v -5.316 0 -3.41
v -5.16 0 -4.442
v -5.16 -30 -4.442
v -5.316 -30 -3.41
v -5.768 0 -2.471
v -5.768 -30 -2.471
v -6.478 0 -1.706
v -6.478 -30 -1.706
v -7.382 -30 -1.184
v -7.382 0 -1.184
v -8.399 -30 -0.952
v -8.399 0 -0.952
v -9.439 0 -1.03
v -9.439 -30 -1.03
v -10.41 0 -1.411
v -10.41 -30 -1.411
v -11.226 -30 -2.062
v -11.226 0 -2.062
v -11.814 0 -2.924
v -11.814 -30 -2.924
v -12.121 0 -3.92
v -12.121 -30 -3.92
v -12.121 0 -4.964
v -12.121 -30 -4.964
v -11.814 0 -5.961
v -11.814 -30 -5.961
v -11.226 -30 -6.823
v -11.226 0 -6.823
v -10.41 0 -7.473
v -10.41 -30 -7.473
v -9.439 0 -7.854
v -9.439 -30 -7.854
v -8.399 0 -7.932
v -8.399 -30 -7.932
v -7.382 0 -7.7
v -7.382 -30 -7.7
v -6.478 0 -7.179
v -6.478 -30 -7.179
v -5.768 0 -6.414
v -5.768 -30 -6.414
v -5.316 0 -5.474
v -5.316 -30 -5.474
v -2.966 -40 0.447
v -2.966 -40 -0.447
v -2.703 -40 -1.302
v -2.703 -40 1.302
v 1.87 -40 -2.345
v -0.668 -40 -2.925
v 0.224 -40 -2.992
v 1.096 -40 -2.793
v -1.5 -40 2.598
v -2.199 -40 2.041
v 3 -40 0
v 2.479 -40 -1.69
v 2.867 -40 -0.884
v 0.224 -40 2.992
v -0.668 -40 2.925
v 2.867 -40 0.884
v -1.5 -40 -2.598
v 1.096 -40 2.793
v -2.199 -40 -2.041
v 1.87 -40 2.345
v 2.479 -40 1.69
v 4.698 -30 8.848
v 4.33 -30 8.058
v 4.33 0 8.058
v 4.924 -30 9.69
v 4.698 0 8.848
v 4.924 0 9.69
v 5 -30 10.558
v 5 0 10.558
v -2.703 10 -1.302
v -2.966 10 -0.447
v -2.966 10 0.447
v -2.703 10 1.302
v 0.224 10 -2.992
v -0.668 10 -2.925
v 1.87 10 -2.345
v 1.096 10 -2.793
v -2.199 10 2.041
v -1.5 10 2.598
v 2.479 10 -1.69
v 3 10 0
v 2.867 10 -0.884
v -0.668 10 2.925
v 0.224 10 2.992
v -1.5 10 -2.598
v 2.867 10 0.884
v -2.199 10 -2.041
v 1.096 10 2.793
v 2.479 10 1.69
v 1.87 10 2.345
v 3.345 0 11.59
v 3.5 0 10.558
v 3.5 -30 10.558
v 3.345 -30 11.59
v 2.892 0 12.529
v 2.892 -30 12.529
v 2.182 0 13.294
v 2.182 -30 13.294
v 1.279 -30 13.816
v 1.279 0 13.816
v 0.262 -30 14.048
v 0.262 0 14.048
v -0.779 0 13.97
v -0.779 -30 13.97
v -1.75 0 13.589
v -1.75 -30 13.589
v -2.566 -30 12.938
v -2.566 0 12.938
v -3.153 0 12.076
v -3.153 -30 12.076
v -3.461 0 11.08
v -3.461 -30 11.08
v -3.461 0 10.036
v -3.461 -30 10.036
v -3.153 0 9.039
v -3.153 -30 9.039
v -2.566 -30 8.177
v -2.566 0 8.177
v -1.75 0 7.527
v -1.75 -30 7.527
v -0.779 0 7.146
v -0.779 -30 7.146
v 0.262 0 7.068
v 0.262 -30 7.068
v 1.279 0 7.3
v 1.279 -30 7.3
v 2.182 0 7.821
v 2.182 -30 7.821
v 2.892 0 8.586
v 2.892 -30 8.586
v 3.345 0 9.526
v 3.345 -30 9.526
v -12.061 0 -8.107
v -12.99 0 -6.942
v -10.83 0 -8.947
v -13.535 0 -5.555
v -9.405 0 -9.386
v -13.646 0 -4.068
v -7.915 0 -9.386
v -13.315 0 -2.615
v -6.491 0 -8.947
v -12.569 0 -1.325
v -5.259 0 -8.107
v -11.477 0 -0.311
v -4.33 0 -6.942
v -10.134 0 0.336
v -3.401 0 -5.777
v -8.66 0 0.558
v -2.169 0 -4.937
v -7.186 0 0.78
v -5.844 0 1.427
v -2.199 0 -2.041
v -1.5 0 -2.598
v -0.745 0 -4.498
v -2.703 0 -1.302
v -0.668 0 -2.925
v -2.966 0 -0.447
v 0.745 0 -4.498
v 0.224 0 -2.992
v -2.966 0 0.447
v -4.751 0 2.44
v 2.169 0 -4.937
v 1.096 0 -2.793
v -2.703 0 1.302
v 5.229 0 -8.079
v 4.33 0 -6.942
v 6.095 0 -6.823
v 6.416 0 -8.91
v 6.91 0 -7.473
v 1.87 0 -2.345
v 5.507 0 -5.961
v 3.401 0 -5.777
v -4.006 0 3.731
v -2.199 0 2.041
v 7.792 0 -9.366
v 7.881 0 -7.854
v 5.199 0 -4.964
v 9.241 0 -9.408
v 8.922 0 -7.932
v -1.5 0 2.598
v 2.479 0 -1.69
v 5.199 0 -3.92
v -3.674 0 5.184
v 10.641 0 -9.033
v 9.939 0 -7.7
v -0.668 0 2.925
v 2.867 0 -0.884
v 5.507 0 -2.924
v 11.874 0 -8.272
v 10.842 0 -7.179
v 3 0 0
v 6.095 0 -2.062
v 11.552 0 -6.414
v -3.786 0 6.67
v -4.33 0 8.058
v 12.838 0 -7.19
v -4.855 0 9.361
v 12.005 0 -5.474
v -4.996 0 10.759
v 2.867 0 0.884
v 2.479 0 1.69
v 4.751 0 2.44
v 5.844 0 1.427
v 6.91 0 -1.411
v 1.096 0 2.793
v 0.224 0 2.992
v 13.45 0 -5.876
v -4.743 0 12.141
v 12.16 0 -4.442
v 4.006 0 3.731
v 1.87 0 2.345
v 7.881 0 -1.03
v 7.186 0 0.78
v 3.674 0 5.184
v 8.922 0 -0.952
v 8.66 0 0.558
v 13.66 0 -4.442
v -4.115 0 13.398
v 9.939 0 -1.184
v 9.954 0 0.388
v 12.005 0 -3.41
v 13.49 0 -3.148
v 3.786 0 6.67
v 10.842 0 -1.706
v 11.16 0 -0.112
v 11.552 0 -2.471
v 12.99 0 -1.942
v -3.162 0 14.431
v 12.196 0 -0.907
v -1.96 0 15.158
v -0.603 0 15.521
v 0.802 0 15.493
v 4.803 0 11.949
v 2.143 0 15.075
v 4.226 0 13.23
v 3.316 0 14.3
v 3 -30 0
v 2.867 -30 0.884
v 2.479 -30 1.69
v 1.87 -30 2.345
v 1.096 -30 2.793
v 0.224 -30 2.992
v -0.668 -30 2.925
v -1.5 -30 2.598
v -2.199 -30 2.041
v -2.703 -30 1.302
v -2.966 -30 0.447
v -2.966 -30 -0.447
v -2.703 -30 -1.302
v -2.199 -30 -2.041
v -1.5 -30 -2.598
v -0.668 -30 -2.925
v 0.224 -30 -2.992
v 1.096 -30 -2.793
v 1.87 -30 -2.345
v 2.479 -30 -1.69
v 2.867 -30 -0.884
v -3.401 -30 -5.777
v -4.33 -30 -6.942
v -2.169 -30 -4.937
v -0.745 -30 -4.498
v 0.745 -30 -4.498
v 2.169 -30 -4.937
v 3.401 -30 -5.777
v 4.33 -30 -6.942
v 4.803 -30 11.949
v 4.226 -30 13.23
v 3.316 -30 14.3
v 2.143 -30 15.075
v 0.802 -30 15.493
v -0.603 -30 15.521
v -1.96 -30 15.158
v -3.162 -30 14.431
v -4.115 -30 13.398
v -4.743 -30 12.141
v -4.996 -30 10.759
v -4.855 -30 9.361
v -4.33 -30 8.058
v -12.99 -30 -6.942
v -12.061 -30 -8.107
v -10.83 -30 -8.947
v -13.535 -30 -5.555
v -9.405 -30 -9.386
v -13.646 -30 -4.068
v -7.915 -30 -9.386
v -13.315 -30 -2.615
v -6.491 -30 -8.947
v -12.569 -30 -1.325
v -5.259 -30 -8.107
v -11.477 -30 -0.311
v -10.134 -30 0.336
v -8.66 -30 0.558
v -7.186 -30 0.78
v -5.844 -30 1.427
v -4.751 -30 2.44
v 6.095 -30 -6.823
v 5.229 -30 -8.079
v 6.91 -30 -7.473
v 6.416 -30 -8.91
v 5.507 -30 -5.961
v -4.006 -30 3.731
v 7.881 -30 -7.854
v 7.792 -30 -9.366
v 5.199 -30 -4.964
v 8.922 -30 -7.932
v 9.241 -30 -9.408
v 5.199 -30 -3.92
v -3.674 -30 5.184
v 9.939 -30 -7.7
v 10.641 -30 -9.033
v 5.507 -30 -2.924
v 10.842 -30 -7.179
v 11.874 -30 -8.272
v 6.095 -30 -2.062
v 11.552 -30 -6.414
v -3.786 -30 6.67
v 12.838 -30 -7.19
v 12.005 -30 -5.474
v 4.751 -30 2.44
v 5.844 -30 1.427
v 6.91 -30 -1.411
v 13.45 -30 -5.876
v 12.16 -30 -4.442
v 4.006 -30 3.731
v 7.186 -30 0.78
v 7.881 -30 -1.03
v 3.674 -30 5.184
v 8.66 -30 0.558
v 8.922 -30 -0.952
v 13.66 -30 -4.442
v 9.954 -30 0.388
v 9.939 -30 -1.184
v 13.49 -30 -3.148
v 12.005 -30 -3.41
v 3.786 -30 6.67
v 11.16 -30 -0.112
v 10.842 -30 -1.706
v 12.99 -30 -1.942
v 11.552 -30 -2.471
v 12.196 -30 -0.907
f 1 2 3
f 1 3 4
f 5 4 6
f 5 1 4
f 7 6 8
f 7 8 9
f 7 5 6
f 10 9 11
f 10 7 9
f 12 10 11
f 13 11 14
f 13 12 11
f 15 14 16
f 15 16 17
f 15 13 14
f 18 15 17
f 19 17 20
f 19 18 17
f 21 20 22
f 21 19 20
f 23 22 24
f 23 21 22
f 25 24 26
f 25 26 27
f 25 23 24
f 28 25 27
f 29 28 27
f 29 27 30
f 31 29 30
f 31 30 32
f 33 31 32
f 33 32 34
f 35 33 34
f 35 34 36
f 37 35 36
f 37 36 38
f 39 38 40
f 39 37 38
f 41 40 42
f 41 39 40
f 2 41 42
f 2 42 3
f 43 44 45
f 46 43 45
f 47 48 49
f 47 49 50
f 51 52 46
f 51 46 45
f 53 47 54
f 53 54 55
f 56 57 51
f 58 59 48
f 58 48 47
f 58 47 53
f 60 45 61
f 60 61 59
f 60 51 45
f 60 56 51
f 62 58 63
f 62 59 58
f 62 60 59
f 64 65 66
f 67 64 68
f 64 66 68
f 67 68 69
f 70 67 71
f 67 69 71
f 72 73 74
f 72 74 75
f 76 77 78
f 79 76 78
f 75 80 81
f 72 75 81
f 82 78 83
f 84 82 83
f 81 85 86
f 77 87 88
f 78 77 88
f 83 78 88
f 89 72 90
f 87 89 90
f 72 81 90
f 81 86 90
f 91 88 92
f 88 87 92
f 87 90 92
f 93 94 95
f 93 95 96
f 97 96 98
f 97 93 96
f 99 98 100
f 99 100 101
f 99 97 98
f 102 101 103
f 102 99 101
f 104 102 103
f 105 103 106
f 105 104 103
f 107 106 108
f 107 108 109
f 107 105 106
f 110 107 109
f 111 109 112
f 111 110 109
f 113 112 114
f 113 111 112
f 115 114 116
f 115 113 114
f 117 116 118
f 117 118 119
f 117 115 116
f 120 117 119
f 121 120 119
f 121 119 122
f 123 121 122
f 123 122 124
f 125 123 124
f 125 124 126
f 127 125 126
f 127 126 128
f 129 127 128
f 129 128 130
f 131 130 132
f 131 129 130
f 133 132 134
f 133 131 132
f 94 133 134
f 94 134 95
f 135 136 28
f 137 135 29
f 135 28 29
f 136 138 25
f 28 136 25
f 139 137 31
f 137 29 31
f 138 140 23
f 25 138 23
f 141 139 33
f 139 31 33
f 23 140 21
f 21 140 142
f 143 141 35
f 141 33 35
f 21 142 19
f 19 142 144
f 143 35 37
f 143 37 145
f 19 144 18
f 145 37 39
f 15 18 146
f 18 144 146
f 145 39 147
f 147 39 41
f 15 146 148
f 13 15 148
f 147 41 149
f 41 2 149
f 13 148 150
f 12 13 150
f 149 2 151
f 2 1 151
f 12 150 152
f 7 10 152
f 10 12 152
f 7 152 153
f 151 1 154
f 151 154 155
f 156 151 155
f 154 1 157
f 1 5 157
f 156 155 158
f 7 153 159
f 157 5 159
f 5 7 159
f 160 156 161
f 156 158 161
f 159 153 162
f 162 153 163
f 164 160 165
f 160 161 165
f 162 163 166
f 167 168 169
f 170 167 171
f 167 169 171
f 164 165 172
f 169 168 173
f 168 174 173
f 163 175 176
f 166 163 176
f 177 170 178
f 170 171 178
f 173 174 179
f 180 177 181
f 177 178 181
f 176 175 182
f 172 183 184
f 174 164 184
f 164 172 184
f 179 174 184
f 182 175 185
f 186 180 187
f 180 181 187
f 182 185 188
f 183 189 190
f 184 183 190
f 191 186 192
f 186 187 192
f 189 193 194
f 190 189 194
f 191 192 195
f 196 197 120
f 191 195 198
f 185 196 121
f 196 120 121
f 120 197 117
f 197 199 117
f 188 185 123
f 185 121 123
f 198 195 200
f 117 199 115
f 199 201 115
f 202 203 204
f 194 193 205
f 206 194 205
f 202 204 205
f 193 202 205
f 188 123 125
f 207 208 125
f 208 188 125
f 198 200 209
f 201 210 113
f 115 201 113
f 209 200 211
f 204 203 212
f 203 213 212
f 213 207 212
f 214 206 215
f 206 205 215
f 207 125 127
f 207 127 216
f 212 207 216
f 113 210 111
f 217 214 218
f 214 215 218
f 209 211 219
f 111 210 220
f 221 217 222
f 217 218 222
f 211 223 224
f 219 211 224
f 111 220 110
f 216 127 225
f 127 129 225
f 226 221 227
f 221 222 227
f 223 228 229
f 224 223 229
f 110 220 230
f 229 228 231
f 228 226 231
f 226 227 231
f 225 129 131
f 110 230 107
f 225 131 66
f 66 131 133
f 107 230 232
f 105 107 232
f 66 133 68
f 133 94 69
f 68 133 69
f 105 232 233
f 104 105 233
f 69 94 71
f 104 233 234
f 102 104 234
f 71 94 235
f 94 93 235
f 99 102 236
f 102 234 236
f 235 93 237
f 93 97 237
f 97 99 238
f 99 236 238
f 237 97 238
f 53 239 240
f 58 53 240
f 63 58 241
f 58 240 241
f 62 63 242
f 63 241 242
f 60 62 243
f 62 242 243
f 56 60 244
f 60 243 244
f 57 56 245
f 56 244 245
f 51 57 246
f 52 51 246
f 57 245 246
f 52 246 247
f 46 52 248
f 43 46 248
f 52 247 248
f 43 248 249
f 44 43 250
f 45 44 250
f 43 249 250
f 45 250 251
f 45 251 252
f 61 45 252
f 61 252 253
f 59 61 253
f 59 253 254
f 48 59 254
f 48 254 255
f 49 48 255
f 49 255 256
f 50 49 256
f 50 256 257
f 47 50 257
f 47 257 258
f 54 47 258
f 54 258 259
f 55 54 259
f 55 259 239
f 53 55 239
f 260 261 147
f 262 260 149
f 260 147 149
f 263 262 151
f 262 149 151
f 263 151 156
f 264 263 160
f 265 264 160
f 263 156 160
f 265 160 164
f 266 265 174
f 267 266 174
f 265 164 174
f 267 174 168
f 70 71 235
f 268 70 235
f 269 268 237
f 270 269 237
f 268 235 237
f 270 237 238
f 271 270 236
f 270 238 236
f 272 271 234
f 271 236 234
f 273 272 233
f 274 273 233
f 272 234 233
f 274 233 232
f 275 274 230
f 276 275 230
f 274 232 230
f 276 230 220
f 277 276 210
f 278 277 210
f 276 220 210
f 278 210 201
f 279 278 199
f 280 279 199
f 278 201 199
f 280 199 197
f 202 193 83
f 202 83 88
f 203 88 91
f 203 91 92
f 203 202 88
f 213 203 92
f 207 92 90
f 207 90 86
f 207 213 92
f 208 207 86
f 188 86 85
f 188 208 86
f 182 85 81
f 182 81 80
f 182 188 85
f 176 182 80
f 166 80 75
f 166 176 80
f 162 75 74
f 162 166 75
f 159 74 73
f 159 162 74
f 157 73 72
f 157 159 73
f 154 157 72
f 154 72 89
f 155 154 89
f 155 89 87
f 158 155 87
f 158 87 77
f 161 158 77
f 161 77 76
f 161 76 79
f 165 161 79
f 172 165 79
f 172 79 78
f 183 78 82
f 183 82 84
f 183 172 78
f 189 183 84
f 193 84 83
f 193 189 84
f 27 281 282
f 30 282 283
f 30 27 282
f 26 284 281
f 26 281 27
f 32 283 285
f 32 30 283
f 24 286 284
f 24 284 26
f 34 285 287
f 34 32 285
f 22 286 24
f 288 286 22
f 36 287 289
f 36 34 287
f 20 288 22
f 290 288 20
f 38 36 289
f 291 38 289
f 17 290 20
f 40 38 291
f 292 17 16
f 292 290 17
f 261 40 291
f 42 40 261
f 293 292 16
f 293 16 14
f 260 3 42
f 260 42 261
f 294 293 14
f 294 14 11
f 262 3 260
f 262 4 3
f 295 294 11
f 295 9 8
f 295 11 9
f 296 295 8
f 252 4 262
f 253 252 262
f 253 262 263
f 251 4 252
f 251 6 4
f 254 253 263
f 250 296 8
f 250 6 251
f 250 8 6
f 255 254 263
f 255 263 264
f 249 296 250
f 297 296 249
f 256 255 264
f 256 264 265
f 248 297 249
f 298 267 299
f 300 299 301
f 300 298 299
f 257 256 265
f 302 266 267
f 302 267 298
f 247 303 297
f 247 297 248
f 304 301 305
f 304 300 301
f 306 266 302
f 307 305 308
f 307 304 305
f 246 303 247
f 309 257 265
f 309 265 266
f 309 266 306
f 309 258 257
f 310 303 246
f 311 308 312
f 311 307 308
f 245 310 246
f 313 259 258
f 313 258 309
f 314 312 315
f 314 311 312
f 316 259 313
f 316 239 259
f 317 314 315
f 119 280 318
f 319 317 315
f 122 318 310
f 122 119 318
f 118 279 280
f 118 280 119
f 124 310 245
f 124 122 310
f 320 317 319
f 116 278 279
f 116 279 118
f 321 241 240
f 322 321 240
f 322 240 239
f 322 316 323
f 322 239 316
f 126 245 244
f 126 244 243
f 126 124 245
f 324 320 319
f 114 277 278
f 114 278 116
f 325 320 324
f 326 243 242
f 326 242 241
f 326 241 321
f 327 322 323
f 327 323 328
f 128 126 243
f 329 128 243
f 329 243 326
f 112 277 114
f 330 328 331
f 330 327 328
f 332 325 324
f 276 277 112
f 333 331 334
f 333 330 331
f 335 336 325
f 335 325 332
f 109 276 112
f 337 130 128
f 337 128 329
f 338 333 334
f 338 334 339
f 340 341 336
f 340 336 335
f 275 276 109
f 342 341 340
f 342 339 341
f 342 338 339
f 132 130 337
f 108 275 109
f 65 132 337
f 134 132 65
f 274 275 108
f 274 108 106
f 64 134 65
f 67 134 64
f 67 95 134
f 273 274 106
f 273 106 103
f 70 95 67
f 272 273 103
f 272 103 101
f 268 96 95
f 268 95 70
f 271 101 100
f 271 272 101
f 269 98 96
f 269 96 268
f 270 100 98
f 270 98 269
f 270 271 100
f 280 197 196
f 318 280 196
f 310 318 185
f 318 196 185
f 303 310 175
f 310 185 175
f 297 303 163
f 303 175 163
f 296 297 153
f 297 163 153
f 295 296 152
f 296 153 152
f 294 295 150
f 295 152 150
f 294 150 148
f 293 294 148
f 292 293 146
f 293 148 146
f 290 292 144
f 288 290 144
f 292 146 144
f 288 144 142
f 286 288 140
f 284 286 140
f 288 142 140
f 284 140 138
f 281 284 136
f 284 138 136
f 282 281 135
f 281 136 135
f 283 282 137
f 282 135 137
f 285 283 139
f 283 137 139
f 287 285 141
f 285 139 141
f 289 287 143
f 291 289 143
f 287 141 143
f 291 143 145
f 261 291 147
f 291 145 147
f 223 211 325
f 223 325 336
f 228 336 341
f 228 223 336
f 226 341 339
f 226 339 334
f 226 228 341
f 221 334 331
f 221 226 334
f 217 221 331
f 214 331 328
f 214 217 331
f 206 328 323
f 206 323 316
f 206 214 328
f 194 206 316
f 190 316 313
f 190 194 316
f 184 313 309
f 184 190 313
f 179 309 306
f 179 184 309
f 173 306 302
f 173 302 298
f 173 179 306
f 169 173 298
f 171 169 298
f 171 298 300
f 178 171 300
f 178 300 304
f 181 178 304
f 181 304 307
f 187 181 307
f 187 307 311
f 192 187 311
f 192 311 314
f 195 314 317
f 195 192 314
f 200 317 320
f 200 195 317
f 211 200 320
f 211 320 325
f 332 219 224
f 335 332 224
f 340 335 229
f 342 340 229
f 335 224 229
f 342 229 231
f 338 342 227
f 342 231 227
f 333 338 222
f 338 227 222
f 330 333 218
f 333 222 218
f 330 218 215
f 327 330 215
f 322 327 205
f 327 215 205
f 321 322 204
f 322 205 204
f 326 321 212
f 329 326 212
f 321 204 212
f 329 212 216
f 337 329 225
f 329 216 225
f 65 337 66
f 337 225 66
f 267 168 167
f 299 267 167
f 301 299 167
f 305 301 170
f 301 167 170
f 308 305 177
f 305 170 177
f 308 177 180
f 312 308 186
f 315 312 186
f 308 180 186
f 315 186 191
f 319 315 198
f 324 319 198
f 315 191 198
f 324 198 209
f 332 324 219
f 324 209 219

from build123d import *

# Parameters (mm, degrees)
F0_R          = 3.5
F1_DEPTH      = 30
F2_R          = 3
F3_DEPTH      = 40
F3_DEPTH_BACK = 10


# Not quite as in the source:
# - ends of sketch curves that miss each other by under 0.0002 mm in the source are joined


with BuildPart() as f1:
    # F0 (on Front) → F1 (new body)
    with BuildSketch(Plane.XZ):
        with BuildLine():
            ThreePointArc((-4.3301281481, 8.0578746702), (-6.557e-07, 5.5578757428), (4.330125744, 8.057876563))
            ThreePointArc((4.330125744, 8.057876563), (4.8296291409, 9.2637805524), (5, 10.5578757428))
            ThreePointArc((5, 10.5578757428), (-1.2940954014, 15.3875048271), (-4.3301281481, 8.0578746702))
        make_face()
        with Locations((0, 10.5578757428)):
            Circle(F0_R, mode=Mode.SUBTRACT)
        with BuildLine():
            ThreePointArc((8.6602543293, 0.557875869), (4.3301271646, 3.0578757428), (4.3301270553, 8.0578758059))
            ThreePointArc((4.3301270553, 8.0578758059), (-6.557e-07, 5.5578757428), (-4.3301281481, 8.0578746702))
            ThreePointArc((-4.3301281481, 8.0578746702), (-4.330127711, 3.0578747964), (-8.6602543293, 0.5578743547))
            ThreePointArc((-8.6602543293, 0.5578743547), (-5.1247199995, -0.9065915075), (-3.6602536736, -4.4421256453))
            ThreePointArc((-3.6602536736, -4.4421256453), (-3.8306244761, -5.7362206245), (-4.3301263997, -6.9421252036))
            ThreePointArc((-4.3301263997, -6.9421252036), (4.371e-07, -4.442124762), (4.330127711, -6.9421244465))
            ThreePointArc((4.330127711, -6.9421244465), (4.3301273832, -1.9421243834), (8.6602543293, 0.557875869))
        make_face()
        with BuildLine():
            ThreePointArc((13.6602545478, -4.442124131), (12.1957883765, -0.9065901478), (8.6602543293, 0.557875869))
            ThreePointArc((8.6602543293, 0.557875869), (4.3301273832, -1.9421243834), (4.330127711, -6.9421244465))
            ThreePointArc((4.330127711, -6.9421244465), (9.9543499492, -9.2717532153), (13.6602545478, -4.442124131))
        make_face()
        with Locations((8.6602545478, -4.442124131)):
            Circle(F0_R, mode=Mode.SUBTRACT)
        with BuildLine():
            ThreePointArc((-3.6602536736, -4.4421256453), (-5.1247199995, -0.9065915075), (-8.6602543293, 0.5578743547))
            ThreePointArc((-8.6602543293, 0.5578743547), (-12.9903804011, -6.94212615), (-4.3301263997, -6.9421252036))
            ThreePointArc((-4.3301263997, -6.9421252036), (-3.8306244761, -5.7362206245), (-3.6602536736, -4.4421256453))
        make_face()
        with Locations((-8.6602536736, -4.4421256453)):
            Circle(F0_R, mode=Mode.SUBTRACT)
    extrude(amount=F1_DEPTH)

    # F2 (on Front) → F3 (join, two sides)
    with BuildSketch(Plane.XZ) as f3_sk:
        Circle(F2_R)
    extrude(amount=F3_DEPTH)
    extrude(f3_sk.sketch, amount=-F3_DEPTH_BACK)


solid = f1.part
